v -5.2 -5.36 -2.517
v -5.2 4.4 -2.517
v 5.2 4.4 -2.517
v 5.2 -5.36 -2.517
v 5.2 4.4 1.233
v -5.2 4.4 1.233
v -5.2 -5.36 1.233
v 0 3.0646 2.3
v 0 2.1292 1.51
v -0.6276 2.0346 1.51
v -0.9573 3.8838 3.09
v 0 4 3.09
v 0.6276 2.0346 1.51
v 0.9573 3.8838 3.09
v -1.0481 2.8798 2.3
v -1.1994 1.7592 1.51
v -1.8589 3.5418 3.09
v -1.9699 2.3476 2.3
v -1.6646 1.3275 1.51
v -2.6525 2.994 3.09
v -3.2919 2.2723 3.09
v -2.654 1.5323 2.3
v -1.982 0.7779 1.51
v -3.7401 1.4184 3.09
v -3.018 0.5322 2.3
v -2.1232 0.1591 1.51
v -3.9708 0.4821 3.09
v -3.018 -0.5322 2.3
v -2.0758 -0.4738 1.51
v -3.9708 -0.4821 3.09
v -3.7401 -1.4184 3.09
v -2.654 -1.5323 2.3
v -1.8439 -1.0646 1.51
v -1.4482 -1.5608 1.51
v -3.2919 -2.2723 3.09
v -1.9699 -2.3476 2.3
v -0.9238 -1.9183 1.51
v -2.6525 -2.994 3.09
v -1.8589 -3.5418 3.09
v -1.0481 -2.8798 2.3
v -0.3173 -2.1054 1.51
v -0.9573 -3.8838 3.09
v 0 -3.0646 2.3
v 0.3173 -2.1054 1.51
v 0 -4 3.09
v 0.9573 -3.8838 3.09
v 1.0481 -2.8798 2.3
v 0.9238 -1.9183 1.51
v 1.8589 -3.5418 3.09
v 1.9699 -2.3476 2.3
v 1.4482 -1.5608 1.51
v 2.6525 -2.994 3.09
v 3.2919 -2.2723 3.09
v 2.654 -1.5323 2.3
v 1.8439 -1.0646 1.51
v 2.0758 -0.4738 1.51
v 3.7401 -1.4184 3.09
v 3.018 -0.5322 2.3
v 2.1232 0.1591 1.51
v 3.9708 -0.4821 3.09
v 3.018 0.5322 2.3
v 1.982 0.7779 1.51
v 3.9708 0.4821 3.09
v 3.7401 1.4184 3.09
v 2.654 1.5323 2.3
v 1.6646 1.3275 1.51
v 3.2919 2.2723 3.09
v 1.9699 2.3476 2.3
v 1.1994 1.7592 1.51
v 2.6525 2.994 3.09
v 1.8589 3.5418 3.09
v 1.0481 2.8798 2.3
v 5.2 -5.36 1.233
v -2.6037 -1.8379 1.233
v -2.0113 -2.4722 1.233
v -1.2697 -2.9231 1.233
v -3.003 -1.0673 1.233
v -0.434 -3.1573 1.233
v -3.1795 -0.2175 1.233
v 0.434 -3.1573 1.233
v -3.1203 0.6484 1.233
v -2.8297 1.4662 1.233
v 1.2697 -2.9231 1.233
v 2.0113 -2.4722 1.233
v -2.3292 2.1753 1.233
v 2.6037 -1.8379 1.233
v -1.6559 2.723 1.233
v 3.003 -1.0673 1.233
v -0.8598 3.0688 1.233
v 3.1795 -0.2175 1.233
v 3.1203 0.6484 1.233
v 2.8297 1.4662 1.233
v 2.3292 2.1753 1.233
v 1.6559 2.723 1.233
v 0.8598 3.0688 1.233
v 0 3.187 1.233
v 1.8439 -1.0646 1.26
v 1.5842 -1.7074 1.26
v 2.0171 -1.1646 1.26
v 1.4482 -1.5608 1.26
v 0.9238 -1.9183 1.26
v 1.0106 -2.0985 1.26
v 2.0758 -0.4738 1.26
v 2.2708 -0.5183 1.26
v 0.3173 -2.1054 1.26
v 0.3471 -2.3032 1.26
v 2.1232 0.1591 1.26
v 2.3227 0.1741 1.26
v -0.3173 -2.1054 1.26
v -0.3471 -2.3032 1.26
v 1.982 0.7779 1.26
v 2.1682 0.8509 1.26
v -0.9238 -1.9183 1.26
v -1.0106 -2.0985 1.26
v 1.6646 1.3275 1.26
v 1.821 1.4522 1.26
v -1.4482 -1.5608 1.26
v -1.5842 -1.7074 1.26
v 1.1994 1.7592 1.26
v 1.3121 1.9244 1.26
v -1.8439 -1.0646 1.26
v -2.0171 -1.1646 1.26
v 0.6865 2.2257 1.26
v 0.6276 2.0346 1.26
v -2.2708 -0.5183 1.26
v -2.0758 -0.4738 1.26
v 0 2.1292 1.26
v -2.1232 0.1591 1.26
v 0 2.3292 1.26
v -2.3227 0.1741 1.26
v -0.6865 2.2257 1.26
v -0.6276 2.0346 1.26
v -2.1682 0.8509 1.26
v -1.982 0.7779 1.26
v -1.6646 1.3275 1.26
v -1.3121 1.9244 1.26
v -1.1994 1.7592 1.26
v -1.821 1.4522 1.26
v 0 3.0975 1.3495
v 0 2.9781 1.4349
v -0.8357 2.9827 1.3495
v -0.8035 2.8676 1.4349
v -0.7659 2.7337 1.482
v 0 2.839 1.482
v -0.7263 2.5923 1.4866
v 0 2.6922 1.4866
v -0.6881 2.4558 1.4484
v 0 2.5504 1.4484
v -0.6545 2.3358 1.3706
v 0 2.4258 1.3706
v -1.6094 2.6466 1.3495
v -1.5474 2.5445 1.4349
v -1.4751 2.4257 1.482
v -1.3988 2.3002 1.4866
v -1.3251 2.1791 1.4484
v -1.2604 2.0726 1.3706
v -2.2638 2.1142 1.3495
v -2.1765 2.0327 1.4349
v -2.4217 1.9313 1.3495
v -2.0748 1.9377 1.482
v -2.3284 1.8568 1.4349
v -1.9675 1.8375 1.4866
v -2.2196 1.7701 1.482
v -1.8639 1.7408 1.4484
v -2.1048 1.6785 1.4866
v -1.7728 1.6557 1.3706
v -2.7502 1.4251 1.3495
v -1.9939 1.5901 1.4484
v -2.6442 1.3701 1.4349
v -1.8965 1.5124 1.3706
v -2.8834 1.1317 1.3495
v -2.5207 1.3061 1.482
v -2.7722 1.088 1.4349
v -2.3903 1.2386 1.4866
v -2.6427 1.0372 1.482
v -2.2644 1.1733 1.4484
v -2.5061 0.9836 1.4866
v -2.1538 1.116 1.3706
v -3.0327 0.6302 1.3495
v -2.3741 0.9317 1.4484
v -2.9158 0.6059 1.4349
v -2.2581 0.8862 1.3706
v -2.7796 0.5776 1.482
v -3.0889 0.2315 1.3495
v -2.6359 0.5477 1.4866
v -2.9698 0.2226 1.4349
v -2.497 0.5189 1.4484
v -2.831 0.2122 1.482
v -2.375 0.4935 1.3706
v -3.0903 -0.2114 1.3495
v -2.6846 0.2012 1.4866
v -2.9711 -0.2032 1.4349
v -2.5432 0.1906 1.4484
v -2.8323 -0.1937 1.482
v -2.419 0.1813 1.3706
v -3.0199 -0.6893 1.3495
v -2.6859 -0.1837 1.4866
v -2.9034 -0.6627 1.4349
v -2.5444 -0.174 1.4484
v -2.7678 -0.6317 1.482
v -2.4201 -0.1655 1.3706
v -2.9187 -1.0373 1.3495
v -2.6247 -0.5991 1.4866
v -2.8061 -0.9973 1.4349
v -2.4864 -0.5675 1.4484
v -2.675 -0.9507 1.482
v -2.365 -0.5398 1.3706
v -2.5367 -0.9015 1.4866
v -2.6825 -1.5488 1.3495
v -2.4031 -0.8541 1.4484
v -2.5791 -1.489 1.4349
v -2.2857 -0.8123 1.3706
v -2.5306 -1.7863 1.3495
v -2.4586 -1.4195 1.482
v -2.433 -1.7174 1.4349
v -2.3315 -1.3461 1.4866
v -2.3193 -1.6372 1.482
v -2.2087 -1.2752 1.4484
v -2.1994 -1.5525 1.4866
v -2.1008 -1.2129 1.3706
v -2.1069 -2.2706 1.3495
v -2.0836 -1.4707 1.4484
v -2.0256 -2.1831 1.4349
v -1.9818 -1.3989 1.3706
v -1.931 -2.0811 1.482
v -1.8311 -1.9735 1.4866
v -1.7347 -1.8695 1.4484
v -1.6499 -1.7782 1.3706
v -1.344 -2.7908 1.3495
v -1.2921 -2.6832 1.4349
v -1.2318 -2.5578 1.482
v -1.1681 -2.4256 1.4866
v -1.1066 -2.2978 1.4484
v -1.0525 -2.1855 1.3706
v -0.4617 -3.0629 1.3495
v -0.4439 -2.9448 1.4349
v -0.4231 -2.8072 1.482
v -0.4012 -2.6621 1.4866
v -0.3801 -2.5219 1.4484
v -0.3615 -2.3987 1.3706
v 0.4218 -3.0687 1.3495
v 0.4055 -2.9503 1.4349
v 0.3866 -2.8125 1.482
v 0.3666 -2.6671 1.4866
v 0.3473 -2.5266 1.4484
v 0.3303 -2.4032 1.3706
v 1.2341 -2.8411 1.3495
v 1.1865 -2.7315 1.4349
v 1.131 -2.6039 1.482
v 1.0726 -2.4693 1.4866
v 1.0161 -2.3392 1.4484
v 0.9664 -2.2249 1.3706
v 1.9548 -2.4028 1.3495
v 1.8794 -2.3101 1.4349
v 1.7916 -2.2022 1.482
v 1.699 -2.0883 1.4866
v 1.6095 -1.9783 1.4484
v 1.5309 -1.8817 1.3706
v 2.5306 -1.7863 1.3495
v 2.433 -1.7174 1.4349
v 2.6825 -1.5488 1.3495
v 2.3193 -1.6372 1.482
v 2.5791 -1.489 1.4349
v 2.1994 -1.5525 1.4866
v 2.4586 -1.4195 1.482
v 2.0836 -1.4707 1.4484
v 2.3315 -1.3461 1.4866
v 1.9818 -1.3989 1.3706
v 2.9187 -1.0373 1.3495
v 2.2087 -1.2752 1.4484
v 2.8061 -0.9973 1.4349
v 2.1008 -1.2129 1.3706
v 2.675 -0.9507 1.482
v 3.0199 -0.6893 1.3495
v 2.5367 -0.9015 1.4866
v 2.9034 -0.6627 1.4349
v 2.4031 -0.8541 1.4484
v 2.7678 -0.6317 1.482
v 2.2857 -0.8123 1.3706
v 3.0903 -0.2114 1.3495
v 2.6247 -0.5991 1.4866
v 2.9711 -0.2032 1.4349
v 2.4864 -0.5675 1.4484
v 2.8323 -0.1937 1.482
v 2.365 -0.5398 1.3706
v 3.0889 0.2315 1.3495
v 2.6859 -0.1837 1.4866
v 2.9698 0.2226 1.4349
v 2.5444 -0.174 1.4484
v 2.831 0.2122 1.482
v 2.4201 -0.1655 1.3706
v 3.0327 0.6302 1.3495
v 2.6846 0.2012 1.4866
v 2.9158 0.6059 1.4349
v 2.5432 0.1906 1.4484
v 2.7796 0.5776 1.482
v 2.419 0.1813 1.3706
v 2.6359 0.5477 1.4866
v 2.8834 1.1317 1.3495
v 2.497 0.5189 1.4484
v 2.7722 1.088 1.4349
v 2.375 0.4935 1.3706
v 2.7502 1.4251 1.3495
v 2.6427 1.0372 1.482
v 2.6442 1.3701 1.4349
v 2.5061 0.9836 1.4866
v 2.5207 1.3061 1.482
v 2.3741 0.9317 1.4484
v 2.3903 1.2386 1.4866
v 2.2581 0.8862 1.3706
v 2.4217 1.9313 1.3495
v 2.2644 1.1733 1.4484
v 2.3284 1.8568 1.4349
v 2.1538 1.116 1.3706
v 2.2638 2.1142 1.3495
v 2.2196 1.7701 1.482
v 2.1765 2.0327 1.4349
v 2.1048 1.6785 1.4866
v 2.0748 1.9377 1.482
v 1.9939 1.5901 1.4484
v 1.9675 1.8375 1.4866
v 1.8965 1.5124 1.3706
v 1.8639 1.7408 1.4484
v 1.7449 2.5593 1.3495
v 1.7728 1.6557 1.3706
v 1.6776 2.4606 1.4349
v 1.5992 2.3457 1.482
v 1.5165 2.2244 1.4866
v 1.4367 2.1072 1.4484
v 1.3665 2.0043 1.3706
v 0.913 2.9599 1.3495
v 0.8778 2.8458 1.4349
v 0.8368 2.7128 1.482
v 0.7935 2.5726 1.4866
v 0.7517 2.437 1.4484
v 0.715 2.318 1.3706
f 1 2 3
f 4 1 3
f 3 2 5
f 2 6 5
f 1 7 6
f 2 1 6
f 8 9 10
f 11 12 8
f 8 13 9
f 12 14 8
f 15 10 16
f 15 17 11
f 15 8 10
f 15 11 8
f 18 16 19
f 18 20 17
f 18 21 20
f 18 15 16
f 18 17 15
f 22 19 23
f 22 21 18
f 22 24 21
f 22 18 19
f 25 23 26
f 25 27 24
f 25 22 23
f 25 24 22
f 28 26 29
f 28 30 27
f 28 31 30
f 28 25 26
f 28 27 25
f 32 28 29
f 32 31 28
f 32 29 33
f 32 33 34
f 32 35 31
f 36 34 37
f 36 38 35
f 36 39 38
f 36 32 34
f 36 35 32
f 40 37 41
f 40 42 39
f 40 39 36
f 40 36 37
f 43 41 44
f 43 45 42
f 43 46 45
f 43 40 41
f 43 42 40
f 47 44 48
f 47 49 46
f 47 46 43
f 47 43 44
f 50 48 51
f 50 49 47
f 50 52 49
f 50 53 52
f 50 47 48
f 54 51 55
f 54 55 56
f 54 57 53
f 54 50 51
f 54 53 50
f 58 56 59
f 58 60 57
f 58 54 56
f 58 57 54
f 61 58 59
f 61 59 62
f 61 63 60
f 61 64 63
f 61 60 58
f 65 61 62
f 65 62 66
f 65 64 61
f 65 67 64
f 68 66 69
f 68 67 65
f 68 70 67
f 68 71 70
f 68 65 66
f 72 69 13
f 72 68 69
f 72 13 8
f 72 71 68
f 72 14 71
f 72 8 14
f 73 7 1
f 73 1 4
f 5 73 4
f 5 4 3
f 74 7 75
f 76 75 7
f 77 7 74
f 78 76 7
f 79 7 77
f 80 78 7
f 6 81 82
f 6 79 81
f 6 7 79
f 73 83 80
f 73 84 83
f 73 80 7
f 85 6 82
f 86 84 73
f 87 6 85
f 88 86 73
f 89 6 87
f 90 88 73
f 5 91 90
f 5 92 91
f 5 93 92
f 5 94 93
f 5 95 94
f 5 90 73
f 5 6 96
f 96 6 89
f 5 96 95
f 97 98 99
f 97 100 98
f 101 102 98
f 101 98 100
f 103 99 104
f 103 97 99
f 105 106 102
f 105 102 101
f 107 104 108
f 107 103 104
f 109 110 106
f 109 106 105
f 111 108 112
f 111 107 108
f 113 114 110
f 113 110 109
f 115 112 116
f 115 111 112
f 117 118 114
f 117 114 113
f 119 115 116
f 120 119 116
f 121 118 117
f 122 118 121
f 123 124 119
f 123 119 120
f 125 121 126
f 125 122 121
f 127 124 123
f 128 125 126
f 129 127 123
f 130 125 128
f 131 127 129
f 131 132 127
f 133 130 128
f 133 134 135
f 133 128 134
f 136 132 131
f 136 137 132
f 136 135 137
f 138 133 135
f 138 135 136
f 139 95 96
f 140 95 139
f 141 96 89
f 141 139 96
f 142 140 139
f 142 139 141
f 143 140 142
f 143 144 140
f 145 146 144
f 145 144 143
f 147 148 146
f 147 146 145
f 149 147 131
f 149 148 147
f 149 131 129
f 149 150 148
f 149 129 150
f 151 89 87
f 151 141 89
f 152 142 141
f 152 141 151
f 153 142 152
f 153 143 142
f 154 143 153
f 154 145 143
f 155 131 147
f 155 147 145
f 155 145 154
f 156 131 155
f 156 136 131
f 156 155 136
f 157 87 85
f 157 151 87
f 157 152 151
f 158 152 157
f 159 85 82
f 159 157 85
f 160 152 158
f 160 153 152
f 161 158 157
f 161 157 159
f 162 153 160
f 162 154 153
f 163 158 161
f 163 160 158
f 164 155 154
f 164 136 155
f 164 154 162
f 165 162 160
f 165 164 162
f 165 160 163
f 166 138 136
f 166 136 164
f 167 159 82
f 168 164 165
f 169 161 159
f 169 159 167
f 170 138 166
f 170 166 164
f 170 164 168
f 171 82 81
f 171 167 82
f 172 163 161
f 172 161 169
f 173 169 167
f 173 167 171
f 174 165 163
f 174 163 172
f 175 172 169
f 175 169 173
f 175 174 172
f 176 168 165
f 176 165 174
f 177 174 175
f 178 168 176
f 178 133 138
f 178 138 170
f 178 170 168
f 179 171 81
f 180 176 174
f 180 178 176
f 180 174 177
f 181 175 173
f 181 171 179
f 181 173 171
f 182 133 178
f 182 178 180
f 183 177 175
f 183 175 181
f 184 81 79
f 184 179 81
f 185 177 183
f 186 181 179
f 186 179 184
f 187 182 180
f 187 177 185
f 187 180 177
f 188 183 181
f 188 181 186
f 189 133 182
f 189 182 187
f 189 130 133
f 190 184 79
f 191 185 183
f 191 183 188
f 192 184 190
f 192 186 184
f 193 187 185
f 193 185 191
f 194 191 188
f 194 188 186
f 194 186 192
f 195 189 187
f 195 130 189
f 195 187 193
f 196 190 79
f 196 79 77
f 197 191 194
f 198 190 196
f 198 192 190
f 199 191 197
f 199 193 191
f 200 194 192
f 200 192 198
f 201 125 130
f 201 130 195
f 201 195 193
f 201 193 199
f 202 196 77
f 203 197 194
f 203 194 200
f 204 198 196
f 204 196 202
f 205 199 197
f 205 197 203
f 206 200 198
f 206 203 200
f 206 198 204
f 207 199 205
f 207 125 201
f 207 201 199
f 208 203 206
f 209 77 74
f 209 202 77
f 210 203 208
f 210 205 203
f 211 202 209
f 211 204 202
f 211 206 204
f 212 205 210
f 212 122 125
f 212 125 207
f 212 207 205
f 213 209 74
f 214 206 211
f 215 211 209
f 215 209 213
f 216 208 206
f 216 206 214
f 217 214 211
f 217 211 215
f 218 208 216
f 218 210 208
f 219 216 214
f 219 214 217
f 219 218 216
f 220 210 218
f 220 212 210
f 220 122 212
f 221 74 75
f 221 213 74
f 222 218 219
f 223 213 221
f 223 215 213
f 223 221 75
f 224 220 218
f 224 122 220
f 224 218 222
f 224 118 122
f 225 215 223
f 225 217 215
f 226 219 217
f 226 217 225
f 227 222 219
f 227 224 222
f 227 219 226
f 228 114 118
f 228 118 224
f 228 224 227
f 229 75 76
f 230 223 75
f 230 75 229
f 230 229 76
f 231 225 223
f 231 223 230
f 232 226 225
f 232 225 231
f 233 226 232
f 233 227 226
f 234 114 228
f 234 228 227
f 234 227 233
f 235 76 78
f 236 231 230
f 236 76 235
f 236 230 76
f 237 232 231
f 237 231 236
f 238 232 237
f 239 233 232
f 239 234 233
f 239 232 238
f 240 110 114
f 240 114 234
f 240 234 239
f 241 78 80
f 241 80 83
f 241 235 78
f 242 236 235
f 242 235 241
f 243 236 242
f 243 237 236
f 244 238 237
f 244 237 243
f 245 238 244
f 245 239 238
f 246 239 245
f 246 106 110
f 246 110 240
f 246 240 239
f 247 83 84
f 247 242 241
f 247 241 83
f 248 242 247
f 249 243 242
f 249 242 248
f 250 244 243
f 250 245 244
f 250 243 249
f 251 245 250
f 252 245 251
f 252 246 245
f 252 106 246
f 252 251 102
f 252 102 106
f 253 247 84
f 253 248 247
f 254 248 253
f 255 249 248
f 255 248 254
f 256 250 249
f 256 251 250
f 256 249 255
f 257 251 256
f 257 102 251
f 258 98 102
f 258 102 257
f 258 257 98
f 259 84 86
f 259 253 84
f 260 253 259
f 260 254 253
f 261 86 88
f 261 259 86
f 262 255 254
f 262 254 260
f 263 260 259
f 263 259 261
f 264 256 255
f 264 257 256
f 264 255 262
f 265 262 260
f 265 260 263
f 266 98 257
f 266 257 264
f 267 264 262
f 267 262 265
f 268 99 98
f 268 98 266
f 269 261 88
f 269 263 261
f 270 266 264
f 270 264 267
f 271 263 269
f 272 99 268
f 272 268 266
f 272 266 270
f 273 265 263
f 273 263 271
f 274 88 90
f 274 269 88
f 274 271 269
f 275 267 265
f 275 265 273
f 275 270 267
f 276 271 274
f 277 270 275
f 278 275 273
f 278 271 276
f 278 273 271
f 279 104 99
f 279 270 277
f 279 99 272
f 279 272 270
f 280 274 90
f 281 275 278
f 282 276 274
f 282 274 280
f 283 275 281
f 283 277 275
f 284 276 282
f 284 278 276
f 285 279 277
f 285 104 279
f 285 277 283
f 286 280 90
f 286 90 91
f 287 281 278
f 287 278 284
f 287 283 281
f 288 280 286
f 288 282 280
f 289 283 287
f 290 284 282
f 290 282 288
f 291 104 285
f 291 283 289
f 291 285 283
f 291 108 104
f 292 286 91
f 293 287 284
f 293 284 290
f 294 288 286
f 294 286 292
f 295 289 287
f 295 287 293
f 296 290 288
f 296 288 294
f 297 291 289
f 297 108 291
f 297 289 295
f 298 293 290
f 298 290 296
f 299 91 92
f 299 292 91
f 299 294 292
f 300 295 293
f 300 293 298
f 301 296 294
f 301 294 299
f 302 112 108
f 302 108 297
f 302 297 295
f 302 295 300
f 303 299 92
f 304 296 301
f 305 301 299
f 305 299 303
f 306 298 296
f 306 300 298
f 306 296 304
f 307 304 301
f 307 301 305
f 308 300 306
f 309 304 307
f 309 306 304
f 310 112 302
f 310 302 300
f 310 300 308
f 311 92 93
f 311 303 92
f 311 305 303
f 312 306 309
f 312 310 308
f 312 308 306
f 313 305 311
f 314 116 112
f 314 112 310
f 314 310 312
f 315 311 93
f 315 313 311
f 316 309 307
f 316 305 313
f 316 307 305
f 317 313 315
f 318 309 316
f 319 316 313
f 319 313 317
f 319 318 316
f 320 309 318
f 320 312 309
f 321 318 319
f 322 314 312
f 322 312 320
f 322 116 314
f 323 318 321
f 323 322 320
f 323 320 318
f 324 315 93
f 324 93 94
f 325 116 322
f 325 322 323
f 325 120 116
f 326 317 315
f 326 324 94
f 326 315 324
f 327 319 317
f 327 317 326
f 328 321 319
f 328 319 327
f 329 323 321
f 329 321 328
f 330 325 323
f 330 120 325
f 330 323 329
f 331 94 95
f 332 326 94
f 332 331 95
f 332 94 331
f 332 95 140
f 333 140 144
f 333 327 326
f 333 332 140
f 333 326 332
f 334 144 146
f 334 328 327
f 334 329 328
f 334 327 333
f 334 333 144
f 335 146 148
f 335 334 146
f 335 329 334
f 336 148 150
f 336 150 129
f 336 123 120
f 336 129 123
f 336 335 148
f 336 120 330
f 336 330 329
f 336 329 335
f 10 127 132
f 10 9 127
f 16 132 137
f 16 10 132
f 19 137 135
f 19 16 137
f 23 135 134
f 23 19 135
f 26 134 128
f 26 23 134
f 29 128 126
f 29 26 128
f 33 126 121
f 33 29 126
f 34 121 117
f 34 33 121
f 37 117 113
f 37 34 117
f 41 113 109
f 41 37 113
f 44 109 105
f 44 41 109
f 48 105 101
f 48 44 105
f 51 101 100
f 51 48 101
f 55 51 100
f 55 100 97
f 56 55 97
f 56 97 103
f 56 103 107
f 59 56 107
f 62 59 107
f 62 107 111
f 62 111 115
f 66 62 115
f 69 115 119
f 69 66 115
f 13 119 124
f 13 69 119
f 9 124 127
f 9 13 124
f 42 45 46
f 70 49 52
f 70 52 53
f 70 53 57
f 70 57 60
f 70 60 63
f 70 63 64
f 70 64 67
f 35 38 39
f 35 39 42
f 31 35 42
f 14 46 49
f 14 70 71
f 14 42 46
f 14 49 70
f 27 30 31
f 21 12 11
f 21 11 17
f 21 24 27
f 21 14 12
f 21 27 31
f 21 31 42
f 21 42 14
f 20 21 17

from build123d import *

# Parameters (mm, degrees)
SKETCH001_W    = 10.4
SKETCH001_H    = 9.76
PAD_DEPTH      = 0.75
PAD_DEPTH_BACK = 3


with BuildPart() as opening_revolve:
    # Sketch006 → Revolution (revolve)
    with BuildSketch(Plane.YZ):
        with BuildLine():
            Line((0, 0.49), (2.75, 0.49))
            ThreePointArc((2.75, 0.49), (3.188748, 1.229792), (2.329167, 1.26))
            Line((2.329167, 1.26), (2.129167, 1.26))
            Line((2.129167, 1.26), (2.129167, 1.51))
            Line((2.129167, 1.51), (4, 3.09))
            Line((4, 3.09), (0, 3.09))
            Line((0, 3.09), (0, 0.49))
        make_face()
    revolve(axis=Axis((0, 0, 0), (0, 0, 1)))


with BuildPart() as fusion:
    # Sketch001 → Pad (new body, two sides)
    with BuildSketch(Plane.XY) as pad_sk:
        with Locations((0, -0.48)):
            Rectangle(SKETCH001_W, SKETCH001_H)
    extrude(amount=PAD_DEPTH)
    extrude(pad_sk.sketch, amount=-PAD_DEPTH_BACK)


with BuildPart() as fusion_1:
    # Body001 placement: moved
    add(fusion.part.moved(Location((0, 0, 0.483))))

    # Fusion: union opening_revolve
    add(opening_revolve.part)


solid = fusion_1.part
